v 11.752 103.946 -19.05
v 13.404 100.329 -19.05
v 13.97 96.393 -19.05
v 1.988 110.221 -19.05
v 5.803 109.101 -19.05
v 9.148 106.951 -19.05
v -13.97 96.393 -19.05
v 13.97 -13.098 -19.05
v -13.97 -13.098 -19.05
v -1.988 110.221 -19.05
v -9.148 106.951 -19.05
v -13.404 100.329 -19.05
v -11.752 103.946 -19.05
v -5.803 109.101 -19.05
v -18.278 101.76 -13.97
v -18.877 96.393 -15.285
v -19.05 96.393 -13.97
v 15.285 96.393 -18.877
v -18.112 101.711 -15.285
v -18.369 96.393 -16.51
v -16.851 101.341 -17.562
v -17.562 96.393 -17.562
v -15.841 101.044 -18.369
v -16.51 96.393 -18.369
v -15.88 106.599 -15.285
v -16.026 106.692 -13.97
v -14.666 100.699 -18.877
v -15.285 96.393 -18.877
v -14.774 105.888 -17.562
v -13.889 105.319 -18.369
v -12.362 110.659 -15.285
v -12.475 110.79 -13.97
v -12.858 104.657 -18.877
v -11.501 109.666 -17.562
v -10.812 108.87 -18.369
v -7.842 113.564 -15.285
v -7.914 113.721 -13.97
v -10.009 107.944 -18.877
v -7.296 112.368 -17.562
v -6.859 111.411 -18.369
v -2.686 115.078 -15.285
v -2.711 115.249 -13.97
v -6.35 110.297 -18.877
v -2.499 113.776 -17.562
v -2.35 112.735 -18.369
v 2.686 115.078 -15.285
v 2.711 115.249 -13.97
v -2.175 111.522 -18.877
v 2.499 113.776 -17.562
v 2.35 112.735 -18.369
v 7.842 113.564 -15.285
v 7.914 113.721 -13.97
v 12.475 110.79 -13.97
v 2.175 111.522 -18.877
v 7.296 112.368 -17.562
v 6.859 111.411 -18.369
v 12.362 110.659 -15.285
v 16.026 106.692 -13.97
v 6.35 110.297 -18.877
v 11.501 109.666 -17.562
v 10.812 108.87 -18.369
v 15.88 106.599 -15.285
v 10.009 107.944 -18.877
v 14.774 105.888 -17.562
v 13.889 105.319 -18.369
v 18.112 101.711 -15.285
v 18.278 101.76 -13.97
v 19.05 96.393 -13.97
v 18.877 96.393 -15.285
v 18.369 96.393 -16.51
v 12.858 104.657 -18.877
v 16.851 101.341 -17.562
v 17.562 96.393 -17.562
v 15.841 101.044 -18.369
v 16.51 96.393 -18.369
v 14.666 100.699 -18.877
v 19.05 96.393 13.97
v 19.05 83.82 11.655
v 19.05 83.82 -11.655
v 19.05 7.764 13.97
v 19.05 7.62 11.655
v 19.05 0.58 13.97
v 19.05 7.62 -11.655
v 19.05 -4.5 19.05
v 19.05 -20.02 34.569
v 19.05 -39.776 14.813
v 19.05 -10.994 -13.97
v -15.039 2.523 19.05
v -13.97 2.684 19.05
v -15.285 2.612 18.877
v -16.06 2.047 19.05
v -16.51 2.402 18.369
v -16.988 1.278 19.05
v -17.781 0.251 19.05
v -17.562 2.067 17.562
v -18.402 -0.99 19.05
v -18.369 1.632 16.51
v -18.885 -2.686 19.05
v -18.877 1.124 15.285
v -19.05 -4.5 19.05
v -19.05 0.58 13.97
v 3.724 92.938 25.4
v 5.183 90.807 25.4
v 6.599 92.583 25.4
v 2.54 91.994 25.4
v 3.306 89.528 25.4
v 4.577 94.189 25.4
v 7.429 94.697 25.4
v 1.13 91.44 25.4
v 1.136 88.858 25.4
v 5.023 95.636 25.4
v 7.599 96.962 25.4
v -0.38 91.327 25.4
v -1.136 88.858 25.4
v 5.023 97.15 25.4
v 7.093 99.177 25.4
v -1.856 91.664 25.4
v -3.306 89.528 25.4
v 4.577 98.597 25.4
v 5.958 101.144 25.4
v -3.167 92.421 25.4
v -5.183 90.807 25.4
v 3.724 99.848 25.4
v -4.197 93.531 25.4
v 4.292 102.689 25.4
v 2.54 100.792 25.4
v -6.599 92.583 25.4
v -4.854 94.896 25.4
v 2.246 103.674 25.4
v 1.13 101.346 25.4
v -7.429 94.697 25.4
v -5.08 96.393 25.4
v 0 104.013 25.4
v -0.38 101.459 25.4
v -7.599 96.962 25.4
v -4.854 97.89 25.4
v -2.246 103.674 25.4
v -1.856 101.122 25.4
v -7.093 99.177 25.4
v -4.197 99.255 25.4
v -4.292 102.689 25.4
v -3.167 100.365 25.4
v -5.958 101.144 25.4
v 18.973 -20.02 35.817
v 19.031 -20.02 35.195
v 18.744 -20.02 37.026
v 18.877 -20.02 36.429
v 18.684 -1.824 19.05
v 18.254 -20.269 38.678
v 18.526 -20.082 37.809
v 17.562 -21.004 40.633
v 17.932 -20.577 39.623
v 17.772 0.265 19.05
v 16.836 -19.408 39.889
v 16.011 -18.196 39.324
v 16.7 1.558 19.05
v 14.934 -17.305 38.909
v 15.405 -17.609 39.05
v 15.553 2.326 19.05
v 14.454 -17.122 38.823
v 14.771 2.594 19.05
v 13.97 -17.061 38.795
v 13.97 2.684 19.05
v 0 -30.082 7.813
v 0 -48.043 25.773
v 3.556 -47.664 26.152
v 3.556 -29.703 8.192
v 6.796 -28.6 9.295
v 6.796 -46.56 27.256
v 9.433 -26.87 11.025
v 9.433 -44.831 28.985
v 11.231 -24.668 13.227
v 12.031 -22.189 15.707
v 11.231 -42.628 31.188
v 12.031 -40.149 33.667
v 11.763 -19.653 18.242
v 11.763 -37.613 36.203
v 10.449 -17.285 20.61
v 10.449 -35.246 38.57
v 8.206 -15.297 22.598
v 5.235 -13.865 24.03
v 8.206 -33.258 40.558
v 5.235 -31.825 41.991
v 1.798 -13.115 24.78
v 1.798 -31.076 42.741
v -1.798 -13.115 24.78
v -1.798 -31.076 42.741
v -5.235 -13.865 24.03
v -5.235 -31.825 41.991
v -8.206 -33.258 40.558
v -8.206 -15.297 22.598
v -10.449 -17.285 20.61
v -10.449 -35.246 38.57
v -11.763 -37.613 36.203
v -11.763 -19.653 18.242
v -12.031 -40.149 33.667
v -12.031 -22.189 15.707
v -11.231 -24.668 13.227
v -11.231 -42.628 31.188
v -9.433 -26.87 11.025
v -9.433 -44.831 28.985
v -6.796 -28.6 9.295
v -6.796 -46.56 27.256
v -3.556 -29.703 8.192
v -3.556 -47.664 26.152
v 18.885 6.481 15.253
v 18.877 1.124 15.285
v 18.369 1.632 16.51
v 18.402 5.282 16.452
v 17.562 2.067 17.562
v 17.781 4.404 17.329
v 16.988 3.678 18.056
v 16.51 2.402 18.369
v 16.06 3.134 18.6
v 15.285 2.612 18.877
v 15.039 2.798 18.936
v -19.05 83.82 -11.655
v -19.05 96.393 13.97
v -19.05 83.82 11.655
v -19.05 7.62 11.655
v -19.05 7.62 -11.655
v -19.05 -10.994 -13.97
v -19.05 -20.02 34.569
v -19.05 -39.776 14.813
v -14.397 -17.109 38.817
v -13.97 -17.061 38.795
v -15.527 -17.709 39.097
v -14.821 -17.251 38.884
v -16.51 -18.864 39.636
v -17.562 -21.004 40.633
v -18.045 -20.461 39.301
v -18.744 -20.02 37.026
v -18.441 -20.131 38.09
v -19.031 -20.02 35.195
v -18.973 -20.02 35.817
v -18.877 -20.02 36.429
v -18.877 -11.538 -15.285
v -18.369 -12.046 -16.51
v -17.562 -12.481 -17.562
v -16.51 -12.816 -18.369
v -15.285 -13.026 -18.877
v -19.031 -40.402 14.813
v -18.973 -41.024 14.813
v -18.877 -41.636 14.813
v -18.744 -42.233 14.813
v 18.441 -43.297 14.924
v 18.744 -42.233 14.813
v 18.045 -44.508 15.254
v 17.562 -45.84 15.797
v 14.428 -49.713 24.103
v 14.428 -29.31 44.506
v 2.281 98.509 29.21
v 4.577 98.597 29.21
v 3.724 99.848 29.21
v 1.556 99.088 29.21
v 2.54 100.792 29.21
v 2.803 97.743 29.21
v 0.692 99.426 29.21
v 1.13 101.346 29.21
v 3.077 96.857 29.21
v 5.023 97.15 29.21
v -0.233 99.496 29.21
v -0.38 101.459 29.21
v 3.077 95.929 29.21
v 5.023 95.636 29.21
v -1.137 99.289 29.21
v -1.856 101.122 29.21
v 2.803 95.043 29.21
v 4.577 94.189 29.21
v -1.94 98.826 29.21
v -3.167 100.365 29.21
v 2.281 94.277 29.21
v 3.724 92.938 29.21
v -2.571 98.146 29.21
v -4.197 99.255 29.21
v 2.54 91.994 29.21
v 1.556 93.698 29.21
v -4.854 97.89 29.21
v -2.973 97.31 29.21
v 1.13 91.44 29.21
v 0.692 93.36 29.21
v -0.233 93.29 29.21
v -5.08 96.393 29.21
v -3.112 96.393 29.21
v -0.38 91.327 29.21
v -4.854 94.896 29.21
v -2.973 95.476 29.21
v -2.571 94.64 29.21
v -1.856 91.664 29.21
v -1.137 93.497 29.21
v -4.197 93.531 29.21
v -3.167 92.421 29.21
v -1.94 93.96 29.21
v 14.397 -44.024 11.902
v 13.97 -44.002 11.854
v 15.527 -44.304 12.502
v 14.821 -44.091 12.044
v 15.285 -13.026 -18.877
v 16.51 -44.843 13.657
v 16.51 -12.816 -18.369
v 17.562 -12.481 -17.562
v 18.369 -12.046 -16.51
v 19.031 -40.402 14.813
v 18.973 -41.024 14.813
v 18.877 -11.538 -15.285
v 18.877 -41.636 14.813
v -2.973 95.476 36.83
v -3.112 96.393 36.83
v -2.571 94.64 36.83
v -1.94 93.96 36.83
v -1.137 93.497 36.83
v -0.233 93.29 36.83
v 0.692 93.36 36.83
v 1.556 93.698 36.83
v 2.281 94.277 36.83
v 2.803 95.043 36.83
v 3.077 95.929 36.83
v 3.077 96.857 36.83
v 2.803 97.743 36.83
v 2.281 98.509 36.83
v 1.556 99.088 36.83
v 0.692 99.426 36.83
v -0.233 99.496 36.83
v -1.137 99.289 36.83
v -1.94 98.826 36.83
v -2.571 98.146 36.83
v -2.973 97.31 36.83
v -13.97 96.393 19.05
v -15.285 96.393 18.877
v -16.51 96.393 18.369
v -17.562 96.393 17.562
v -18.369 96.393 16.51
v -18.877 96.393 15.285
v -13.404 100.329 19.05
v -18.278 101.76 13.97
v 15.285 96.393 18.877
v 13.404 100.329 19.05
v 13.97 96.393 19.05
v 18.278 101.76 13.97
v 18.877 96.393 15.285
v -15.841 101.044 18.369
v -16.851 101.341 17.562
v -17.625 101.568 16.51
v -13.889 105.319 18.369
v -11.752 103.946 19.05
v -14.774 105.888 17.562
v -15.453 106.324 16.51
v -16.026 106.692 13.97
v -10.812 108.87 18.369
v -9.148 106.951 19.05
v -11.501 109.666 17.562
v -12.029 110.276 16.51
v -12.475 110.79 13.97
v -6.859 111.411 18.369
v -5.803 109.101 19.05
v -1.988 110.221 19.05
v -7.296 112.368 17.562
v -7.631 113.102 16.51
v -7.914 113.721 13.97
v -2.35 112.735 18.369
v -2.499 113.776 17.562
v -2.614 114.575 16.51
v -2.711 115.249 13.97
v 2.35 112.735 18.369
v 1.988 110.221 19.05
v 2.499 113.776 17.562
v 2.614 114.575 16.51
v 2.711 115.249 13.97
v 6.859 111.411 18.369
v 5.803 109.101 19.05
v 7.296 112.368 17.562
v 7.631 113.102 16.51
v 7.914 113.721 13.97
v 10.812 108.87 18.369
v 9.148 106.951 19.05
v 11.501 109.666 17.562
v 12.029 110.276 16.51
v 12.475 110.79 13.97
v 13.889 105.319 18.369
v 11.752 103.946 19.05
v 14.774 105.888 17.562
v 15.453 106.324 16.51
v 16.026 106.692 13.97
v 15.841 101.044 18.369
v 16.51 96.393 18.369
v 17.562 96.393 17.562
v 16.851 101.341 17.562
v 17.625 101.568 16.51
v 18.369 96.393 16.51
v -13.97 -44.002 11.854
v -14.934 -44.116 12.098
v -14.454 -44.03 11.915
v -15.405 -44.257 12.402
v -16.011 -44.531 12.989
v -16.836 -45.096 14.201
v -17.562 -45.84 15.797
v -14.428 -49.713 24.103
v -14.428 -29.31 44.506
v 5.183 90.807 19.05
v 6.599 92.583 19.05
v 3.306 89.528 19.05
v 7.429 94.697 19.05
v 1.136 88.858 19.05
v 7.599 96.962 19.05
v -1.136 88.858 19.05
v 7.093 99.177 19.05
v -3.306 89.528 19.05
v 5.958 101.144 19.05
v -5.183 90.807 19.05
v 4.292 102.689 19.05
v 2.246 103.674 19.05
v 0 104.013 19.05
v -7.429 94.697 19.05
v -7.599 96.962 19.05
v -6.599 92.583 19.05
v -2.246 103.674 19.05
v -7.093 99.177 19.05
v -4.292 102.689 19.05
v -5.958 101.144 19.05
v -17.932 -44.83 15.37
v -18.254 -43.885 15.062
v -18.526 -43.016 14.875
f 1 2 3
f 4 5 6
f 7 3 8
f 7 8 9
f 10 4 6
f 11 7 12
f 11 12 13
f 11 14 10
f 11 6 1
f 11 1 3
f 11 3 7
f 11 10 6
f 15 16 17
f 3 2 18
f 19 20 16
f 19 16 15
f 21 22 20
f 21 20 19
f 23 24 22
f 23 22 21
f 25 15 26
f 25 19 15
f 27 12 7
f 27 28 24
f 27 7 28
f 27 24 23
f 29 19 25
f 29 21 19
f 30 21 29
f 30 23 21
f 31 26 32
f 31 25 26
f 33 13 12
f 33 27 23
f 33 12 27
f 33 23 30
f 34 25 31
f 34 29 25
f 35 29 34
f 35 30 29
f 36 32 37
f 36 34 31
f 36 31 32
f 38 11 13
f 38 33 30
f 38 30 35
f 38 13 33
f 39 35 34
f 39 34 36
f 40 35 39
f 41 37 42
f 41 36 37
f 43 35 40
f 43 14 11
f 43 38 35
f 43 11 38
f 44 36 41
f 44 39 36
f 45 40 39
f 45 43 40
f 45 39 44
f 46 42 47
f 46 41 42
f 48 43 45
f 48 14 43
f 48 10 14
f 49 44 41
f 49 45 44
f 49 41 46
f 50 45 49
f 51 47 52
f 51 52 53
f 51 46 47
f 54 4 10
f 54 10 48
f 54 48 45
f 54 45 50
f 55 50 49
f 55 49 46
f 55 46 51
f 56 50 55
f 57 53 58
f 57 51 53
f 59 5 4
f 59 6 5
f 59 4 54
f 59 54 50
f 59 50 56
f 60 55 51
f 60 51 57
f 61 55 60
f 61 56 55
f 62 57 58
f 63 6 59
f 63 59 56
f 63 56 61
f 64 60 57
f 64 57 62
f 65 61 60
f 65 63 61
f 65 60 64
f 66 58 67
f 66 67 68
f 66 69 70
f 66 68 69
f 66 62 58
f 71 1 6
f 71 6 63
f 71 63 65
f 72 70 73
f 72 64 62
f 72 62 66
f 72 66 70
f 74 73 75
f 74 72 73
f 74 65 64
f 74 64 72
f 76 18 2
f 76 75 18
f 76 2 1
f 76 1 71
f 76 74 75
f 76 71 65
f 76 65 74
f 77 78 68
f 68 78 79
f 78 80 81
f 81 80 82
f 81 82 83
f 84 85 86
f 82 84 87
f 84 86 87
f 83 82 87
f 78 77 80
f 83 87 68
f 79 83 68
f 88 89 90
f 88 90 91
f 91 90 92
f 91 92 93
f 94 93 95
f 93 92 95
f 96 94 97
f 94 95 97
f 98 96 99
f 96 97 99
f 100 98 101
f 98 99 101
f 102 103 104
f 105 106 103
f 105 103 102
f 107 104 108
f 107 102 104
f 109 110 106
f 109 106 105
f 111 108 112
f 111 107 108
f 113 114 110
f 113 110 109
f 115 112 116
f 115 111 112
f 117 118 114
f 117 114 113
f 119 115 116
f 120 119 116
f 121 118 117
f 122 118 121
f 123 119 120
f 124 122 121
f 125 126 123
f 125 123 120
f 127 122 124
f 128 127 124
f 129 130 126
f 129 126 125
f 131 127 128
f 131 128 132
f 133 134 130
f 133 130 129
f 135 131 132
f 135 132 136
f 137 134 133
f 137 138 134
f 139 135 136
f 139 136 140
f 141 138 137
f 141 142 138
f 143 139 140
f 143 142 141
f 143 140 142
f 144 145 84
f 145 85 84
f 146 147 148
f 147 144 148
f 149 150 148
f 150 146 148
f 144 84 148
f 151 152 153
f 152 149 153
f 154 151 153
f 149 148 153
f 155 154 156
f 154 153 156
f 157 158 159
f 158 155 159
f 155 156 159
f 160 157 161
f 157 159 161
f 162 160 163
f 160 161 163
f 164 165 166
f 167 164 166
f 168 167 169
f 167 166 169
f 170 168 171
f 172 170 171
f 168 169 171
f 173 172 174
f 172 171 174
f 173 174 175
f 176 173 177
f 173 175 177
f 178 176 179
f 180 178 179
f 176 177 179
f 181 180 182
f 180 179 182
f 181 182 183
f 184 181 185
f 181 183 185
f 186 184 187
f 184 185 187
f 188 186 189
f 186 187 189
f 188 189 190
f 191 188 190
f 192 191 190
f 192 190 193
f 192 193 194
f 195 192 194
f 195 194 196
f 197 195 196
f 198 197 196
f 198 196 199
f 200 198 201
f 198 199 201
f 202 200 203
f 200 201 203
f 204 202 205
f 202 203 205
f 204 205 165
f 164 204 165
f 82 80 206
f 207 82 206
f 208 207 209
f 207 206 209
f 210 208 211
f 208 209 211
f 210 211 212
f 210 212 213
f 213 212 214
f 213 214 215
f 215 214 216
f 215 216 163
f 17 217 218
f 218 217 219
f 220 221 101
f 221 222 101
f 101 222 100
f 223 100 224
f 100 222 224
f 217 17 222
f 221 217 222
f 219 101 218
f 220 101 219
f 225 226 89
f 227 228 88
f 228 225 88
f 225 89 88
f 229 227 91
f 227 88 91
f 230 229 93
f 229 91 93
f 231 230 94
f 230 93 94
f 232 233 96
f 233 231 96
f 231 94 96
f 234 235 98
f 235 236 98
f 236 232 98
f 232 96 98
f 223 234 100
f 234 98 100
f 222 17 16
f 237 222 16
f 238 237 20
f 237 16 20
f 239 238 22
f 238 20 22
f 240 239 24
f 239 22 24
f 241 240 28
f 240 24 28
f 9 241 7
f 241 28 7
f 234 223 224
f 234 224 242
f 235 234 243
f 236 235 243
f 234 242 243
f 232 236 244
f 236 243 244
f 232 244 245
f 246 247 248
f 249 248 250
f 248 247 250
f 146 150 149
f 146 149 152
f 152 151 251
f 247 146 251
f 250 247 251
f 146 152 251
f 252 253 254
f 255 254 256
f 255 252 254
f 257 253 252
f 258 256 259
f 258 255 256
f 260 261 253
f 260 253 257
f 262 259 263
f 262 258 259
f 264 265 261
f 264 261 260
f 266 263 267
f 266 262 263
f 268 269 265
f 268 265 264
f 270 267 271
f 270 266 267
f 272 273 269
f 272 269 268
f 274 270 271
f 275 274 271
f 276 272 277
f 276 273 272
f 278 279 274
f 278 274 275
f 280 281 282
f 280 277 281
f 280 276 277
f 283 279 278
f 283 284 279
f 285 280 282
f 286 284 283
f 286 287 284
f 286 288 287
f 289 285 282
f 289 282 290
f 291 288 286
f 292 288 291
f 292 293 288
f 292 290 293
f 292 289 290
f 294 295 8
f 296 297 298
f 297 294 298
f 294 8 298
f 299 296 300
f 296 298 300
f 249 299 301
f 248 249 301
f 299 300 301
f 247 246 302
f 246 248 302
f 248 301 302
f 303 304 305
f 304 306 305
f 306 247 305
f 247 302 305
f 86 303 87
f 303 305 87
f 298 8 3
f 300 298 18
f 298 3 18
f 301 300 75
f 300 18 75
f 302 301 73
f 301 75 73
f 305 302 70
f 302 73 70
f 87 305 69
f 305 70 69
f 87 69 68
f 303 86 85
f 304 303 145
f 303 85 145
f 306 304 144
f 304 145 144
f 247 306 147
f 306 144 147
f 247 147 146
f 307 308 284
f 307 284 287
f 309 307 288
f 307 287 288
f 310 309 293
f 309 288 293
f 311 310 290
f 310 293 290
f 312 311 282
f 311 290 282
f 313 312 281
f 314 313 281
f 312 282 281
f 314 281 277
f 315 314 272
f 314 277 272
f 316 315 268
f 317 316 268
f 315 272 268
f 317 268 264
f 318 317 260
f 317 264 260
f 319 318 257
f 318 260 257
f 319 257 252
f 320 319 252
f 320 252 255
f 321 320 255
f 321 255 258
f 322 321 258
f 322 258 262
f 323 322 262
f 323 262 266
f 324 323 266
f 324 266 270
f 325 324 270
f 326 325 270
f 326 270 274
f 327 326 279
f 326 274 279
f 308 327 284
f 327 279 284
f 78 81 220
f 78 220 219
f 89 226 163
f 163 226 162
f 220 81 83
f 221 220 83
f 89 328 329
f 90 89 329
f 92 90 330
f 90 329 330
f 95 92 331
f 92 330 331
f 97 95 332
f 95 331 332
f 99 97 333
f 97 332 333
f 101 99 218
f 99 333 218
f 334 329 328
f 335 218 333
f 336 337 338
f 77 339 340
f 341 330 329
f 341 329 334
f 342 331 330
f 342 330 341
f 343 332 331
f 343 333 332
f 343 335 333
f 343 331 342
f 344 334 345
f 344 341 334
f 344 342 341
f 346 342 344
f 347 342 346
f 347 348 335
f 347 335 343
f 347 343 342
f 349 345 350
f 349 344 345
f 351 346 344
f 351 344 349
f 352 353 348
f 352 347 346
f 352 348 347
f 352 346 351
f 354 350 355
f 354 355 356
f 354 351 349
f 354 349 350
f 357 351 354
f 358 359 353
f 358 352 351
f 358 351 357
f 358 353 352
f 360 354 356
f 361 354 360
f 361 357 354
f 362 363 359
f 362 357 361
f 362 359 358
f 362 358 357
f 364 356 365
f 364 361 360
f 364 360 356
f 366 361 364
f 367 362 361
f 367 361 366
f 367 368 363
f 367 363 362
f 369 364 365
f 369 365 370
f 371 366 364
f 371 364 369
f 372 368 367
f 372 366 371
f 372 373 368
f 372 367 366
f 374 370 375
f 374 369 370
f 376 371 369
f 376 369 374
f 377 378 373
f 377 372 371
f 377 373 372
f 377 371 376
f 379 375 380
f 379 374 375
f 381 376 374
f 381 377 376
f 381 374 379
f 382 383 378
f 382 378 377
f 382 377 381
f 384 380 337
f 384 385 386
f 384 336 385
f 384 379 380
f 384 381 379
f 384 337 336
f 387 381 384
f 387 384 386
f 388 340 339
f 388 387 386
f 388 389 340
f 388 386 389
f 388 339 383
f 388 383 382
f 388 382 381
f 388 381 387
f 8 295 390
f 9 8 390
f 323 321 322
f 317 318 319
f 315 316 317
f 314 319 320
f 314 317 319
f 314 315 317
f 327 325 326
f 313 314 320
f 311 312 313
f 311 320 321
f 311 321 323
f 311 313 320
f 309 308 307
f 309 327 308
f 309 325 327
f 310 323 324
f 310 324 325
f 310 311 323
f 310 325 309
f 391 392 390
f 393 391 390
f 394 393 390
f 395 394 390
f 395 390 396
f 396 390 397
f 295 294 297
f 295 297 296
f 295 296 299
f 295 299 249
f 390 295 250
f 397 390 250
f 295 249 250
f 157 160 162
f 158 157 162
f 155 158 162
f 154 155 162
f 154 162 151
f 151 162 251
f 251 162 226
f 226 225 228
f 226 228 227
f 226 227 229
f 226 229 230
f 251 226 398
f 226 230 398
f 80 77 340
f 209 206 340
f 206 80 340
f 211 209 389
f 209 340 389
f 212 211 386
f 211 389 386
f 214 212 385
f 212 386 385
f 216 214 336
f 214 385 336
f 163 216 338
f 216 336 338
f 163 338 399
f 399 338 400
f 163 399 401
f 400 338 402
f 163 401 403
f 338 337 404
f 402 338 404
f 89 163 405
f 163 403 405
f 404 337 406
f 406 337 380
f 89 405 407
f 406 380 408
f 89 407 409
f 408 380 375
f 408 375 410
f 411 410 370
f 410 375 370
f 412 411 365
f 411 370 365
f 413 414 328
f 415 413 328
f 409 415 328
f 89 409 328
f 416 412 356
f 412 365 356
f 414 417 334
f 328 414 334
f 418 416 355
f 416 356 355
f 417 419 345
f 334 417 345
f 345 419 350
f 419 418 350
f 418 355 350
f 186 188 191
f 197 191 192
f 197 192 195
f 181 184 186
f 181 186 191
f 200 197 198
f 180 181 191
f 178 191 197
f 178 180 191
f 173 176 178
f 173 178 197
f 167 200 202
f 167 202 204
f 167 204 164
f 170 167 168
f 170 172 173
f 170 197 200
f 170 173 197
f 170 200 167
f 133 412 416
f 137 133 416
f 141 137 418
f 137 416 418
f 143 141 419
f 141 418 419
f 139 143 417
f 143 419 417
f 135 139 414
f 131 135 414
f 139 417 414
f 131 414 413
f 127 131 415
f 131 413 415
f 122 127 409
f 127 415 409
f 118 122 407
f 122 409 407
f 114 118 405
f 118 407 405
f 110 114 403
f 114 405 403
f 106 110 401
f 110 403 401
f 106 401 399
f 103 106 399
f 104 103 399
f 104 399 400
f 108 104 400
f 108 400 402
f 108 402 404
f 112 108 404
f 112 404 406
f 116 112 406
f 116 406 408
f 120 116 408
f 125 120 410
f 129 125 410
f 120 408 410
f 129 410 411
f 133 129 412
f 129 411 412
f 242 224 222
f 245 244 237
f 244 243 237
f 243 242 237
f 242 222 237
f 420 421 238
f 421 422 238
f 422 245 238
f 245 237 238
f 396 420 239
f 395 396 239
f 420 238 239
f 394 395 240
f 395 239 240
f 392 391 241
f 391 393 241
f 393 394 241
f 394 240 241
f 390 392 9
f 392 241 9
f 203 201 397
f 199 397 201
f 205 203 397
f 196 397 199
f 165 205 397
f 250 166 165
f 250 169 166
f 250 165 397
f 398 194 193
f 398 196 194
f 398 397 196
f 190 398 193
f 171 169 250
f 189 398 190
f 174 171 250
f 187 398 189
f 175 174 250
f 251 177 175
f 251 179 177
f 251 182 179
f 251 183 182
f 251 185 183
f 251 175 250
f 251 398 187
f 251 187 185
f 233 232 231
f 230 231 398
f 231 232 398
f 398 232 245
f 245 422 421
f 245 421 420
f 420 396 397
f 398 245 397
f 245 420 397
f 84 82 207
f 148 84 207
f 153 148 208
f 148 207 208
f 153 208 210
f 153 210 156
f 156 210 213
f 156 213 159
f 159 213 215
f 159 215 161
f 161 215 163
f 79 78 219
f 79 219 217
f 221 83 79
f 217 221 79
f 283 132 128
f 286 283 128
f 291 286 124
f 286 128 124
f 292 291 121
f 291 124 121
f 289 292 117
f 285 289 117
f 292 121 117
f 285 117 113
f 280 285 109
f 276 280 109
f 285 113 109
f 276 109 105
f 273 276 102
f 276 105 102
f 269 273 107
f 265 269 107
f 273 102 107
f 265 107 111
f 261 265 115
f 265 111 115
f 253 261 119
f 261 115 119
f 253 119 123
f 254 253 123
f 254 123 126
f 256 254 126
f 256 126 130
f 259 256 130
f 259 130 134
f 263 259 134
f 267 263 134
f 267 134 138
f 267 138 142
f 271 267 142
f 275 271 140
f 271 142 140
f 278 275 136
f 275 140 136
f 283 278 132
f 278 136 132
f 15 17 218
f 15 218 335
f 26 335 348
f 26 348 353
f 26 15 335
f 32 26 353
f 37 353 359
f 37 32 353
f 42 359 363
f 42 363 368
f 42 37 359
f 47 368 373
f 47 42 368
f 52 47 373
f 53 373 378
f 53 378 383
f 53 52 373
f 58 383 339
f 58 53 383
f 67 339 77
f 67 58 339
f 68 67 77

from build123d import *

# Parameters (mm, degrees)
SKETCH11_W          = 38.1
SKETCH11_H          = 38.1
SKETCH12_W          = 38.1
SKETCH12_H          = 38.1
BOSS_EXTRUDE5_DEPTH = 12.7
BOSS_EXTRUDE5_TAPER = 20
BOSS_EXTRUDE6_DEPTH = 38.1
SKETCH15_R          = 12.065
CUT_EXTRUDE3_DEPTH  = 25.4
SKETCH16_W          = 23.310601064
SKETCH16_H          = 76.2
CUT_EXTRUDE4_DEPTH  = 59.830675793
SKETCH17_R          = 7.62
BOSS_EXTRUDE7_DEPTH = 6.35
SKETCH18_R          = 5.08
BOSS_EXTRUDE8_DEPTH = 3.81
SKETCH19_R          = 3.1115
BOSS_EXTRUDE9_DEPTH = 7.62
FILLET2_R           = 5.08


with BuildPart() as part:
    # Sweep1: sweep along a path in Sketch10
    with BuildLine(Plane(origin=(0, 0, 0), x_dir=(0, 0, -1), z_dir=(1, 0, 0))) as sweep1_path:
        Line((0, 96.393), (0, -5.207))
        Line((0, -5.207), (-25.324322261, -30.531322261))
    # Sketch11 → Sweep1 (sweep)
    with BuildSketch(Plane(origin=(0, 96.393, 0), x_dir=(1, 0, 0), z_dir=(0, 1, 0))):
        Rectangle(SKETCH11_W, SKETCH11_H)
    sweep(path=sweep1_path.line, transition=Transition.RIGHT)

    # Sketch12 → Boss-Extrude5 (add)
    with BuildSketch(Plane(origin=(0, -27.927822261, 27.927822261), x_dir=(1, 0, 0), z_dir=(0, -0.7071067811865461, 0.7071067811865489))):
        with Locations((0, -3.68190501)):
            Rectangle(SKETCH12_W, SKETCH12_H)
    extrude(amount=BOSS_EXTRUDE5_DEPTH, taper=BOSS_EXTRUDE5_TAPER)

    # Sketch13 → Boss-Extrude6 (add)
    with BuildSketch(Plane(origin=(0, 0, -19.05), x_dir=(-1, 0, 0), z_dir=(0, 0, -1))):
        with BuildLine():
            Line((-19.05, 96.393), (19.05, 96.393))
            ThreePointArc((19.05, 96.393), (0, 115.443), (-19.05, 96.393))
        make_face()
    extrude(amount=-BOSS_EXTRUDE6_DEPTH)

    # Sketch15 → Cut-Extrude3 (cut)
    with BuildSketch(Plane(origin=(0, -36.908078382, 36.908078382), x_dir=(1, 0, 0), z_dir=(0, -0.7071067811865461, 0.7071067811865489))):
        with Locations(Location((0, -3.68190501, 0), (0, 0, 270))):
            Circle(SKETCH15_R)
    extrude(amount=-CUT_EXTRUDE3_DEPTH, mode=Mode.SUBTRACT)

    # Sketch16 → Cut-Extrude4 (cut)
    with BuildSketch(Plane(origin=(19.05, 0, 0), x_dir=(0, 0, -1), z_dir=(1, 0, 0))):
        with Locations((0, 45.72)):
            Rectangle(SKETCH16_W, SKETCH16_H)
    extrude(amount=-CUT_EXTRUDE4_DEPTH, mode=Mode.SUBTRACT)

    # Sketch17 → Boss-Extrude7 (add)
    with BuildSketch(Plane.XY.offset(19.05)):
        with Locations(Location((0, 96.393, 0), (0, 0, 90))):
            Circle(SKETCH17_R)
    extrude(amount=BOSS_EXTRUDE7_DEPTH)

    # Sketch18 → Boss-Extrude8 (add)
    with BuildSketch(Plane.XY.offset(25.4)):
        with Locations(Location((0, 96.393, 0), (0, 0, 180))):
            Circle(SKETCH18_R)
    extrude(amount=BOSS_EXTRUDE8_DEPTH)

    # Sketch19 → Boss-Extrude9 (add)
    with BuildSketch(Plane.XY.offset(29.21)):
        with Locations(Location((0, 96.393, 0), (0, 0, 180))):
            Circle(SKETCH19_R)
    extrude(amount=BOSS_EXTRUDE9_DEPTH)

    # Fillet2
    # the kernel refuses this fillet: 5.08 mm, written as the material it takes off along each edge
    with BuildSketch(Plane(origin=(19.05, 96.393, 19.05), x_dir=(-1, 0, 0), z_dir=(0, -1, 0))) as fillet2_piece_1_section:
        with BuildLine():
            CenterArc((FILLET2_R, FILLET2_R), FILLET2_R, 180, 90)
            Line((0, FILLET2_R), (0, 0))
            Line((0, 0), (FILLET2_R, 0))
        make_face()
    fillet2_piece_1 = extrude(amount=106.409231637, mode=Mode.PRIVATE)
    fillet2_piece_1 = split(fillet2_piece_1, bisect_by=Plane(origin=(17.892257619, 26.96392305, -5.230154687), z_dir=(0, 0.7071067811865489, 0.7071067811865462)), keep=Keep.TOP, mode=Mode.PRIVATE)
    add(fillet2_piece_1, mode=Mode.SUBTRACT)
    with BuildSketch(Plane(origin=(19.05, 96.393, -19.05), x_dir=(0, 0, 1), z_dir=(0, -1, 0))) as fillet2_piece_2:
        with BuildLine():
            CenterArc((FILLET2_R, FILLET2_R), FILLET2_R, 180, 90)
            Line((0, FILLET2_R), (0, 0))
            Line((0, 0), (FILLET2_R, 0))
        make_face()
    extrude(amount=122.190768363, mode=Mode.SUBTRACT)
    with BuildSketch(Plane(origin=(19.05, 11.664024484, 10.069743879), x_dir=(-1, 0, 0), z_dir=(0, -0.7071067811865462, 0.7071067811865489))) as fillet2_piece_3_section:
        with BuildLine():
            CenterArc((FILLET2_R, FILLET2_R), FILLET2_R, 180, 90)
            Line((0, FILLET2_R), (0, 0))
            Line((0, 0), (FILLET2_R, 0))
        make_face()
    fillet2_piece_3 = extrude(amount=53.323231637, mode=Mode.PRIVATE)
    fillet2_piece_3 = split(fillet2_piece_3, bisect_by=Plane(origin=(17.881962417, -12.866336341, 19.05), z_dir=(0, 0, 1)), keep=Keep.TOP, mode=Mode.PRIVATE)
    add(fillet2_piece_3, mode=Mode.SUBTRACT)
    with BuildSketch(Plane(origin=(19.05, -4.117512242, -28.030256121), x_dir=(0, 0.7071067811865489, 0.7071067811865462), z_dir=(0, -0.7071067811865462, 0.7071067811865489))) as fillet2_piece_4:
        with BuildLine():
            CenterArc((FILLET2_R, FILLET2_R), FILLET2_R, 180, 90)
            Line((0, FILLET2_R), (0, 0))
            Line((0, 0), (FILLET2_R, 0))
        make_face()
    extrude(amount=69.104768363, mode=Mode.SUBTRACT)
    with BuildSketch(Plane(origin=(-19.05, -4.117512242, -28.030256121), x_dir=(0, 0.7071067811865488, 0.7071067811865461), z_dir=(0, -0.7071067811865462, 0.7071067811865489))) as fillet2_piece_5:
        with BuildLine():
            CenterArc((FILLET2_R, -FILLET2_R), FILLET2_R, 90, 90)
            Line((0, -FILLET2_R), (0, 0))
            Line((0, 0), (FILLET2_R, 0))
        make_face()
    extrude(amount=69.104768363, mode=Mode.SUBTRACT)
    with BuildSketch(Plane(origin=(-19.05, 11.664024484, 10.069743879), x_dir=(0, -0.7071067811865489, -0.7071067811865462), z_dir=(0, -0.7071067811865462, 0.7071067811865489))) as fillet2_piece_6_section:
        with BuildLine():
            CenterArc((FILLET2_R, FILLET2_R), FILLET2_R, 180, 90)
            Line((0, FILLET2_R), (0, 0))
            Line((0, 0), (FILLET2_R, 0))
        make_face()
    fillet2_piece_6 = extrude(amount=53.323231637, mode=Mode.PRIVATE)
    fillet2_piece_6 = split(fillet2_piece_6, bisect_by=Plane(origin=(-17.881962417, -12.866336341, 19.05), z_dir=(0, 0, 1)), keep=Keep.TOP, mode=Mode.PRIVATE)
    add(fillet2_piece_6, mode=Mode.SUBTRACT)
    with BuildSketch(Plane(origin=(19.05, -15.477476632, 40.378167891), x_dir=(0, 0.7071067811865461, -0.7071067811865488), z_dir=(0, -0.7071067811865489, -0.7071067811865462)), Plane(origin=(-19.05, -45.585167891, 10.270476632), x_dir=(0, 0.7071067811865461, -0.7071067811865489), z_dir=(0, 0.7071067811865489, 0.7071067811865462))) as fillet2_piece_7:
        with BuildLine():
            CenterArc((FILLET2_R * 0.176326980708, -FILLET2_R), FILLET2_R, 90, 20)
            Line((-FILLET2_R * 0.165693162617, -FILLET2_R * 0.0603073792141), (0, 0))
            Line((0, 0), (FILLET2_R * 0.176326980708, 0))
        make_face()
    extrude(amount=42.57870531, mode=Mode.SUBTRACT)
    with BuildSketch(Plane(origin=(-19.05, 96.393, -19.05), x_dir=(0, 0, 1), z_dir=(0, -1, 0))) as fillet2_piece_8:
        with BuildLine():
            CenterArc((FILLET2_R, -FILLET2_R), FILLET2_R, 90, 90)
            Line((0, -FILLET2_R), (0, 0))
            Line((0, 0), (FILLET2_R, 0))
        make_face()
    extrude(amount=122.190768363, mode=Mode.SUBTRACT)
    with BuildSketch(Plane(origin=(-19.05, 96.393, 19.05), x_dir=(1, 0, 0), z_dir=(0, -1, 0))) as fillet2_piece_9_section:
        with BuildLine():
            CenterArc((FILLET2_R, -FILLET2_R), FILLET2_R, 90, 90)
            Line((0, -FILLET2_R), (0, 0))
            Line((0, 0), (FILLET2_R, 0))
        make_face()
    fillet2_piece_9 = extrude(amount=106.409231637, mode=Mode.PRIVATE)
    fillet2_piece_9 = split(fillet2_piece_9, bisect_by=Plane(origin=(-17.892257619, 26.96392305, -5.230154687), z_dir=(0, 0.7071067811865489, 0.7071067811865462)), keep=Keep.TOP, mode=Mode.PRIVATE)
    add(fillet2_piece_9, mode=Mode.SUBTRACT)
    with BuildSketch(Plane(origin=(0, 96.393, -19.05), x_dir=(-1, 0, 0), z_dir=(0, -1, 0))) as fillet2_piece_10:
        with BuildLine():
            CenterArc((19.05 - FILLET2_R, -FILLET2_R), FILLET2_R, 0, 90)
            Line((19.05 - FILLET2_R, 0), (19.05, 0))
            Line((19.05, 0), (19.05, -FILLET2_R))
        make_face()
    revolve(axis=Axis((0, 96.393, -19.05), (0, 0, -1)), revolution_arc=180, mode=Mode.SUBTRACT)
    with BuildSketch(Plane(origin=(0, 96.393, 19.05), x_dir=(-1, 0, 0), z_dir=(0, -1, 0))) as fillet2_piece_11:
        with BuildLine():
            CenterArc((19.05 - FILLET2_R, FILLET2_R), FILLET2_R, 270, 90)
            Line((19.05, FILLET2_R), (19.05, 0))
            Line((19.05, 0), (19.05 - FILLET2_R, 0))
        make_face()
    revolve(axis=Axis((0, 96.393, 19.05), (0, 0, -1)), revolution_arc=180, mode=Mode.SUBTRACT)
    with BuildSketch(Plane(origin=(19.05, 96.393, 19.05), x_dir=(-1, 0, 0), z_dir=(0, -1, 0))) as fillet2_piece_12a_section:
        with BuildLine():
            CenterArc((FILLET2_R, FILLET2_R), FILLET2_R, 180, 90)
            Line((0, FILLET2_R), (0, 0))
            Line((0, 0), (FILLET2_R, 0))
        make_face()
    fillet2_piece_12a = extrude(amount=106.409231637, mode=Mode.PRIVATE)
    fillet2_piece_12a = split(fillet2_piece_12a, bisect_by=Plane(origin=(17.951071981, 0.436282509, 21.297485854), z_dir=(0, -0.7071067811865489, -0.7071067811865462)), keep=Keep.TOP, mode=Mode.PRIVATE)
    with BuildSketch(Plane(origin=(19.05, 11.664024484, 10.069743879), x_dir=(-1, 0, 0), z_dir=(0, -0.7071067811865462, 0.7071067811865489))) as fillet2_piece_12b_section:
        with BuildLine():
            CenterArc((FILLET2_R, FILLET2_R), FILLET2_R, 180, 90)
            Line((0, FILLET2_R), (0, 0))
            Line((0, 0), (FILLET2_R, 0))
        make_face()
    fillet2_piece_12b = extrude(amount=53.323231637, mode=Mode.PRIVATE)
    fillet2_piece_12b = split(fillet2_piece_12b, bisect_by=Plane(origin=(17.951071981, 5.862193339, 19.05), z_dir=(0, 0, -1)), keep=Keep.TOP, mode=Mode.PRIVATE)
    fillet2_piece_12 = fillet2_piece_12a & fillet2_piece_12b
    add(fillet2_piece_12, mode=Mode.SUBTRACT)
    with BuildSketch(Plane(origin=(-19.05, 96.393, 19.05), x_dir=(1, 0, 0), z_dir=(0, -1, 0))) as fillet2_piece_13a_section:
        with BuildLine():
            CenterArc((FILLET2_R, -FILLET2_R), FILLET2_R, 90, 90)
            Line((0, -FILLET2_R), (0, 0))
            Line((0, 0), (FILLET2_R, 0))
        make_face()
    fillet2_piece_13a = extrude(amount=106.409231637, mode=Mode.PRIVATE)
    fillet2_piece_13a = split(fillet2_piece_13a, bisect_by=Plane(origin=(-17.951071981, 0.436282509, 21.297485854), z_dir=(0, -0.7071067811865489, -0.7071067811865462)), keep=Keep.TOP, mode=Mode.PRIVATE)
    with BuildSketch(Plane(origin=(-19.05, 11.664024484, 10.069743879), x_dir=(0, -0.7071067811865489, -0.7071067811865462), z_dir=(0, -0.7071067811865462, 0.7071067811865489))) as fillet2_piece_13b_section:
        with BuildLine():
            CenterArc((FILLET2_R, FILLET2_R), FILLET2_R, 180, 90)
            Line((0, FILLET2_R), (0, 0))
            Line((0, 0), (FILLET2_R, 0))
        make_face()
    fillet2_piece_13b = extrude(amount=53.323231637, mode=Mode.PRIVATE)
    fillet2_piece_13b = split(fillet2_piece_13b, bisect_by=Plane(origin=(-17.951071981, 5.862193339, 19.05), z_dir=(0, 0, -1)), keep=Keep.TOP, mode=Mode.PRIVATE)
    fillet2_piece_13 = fillet2_piece_13a & fillet2_piece_13b
    add(fillet2_piece_13, mode=Mode.SUBTRACT)


solid = part.part
